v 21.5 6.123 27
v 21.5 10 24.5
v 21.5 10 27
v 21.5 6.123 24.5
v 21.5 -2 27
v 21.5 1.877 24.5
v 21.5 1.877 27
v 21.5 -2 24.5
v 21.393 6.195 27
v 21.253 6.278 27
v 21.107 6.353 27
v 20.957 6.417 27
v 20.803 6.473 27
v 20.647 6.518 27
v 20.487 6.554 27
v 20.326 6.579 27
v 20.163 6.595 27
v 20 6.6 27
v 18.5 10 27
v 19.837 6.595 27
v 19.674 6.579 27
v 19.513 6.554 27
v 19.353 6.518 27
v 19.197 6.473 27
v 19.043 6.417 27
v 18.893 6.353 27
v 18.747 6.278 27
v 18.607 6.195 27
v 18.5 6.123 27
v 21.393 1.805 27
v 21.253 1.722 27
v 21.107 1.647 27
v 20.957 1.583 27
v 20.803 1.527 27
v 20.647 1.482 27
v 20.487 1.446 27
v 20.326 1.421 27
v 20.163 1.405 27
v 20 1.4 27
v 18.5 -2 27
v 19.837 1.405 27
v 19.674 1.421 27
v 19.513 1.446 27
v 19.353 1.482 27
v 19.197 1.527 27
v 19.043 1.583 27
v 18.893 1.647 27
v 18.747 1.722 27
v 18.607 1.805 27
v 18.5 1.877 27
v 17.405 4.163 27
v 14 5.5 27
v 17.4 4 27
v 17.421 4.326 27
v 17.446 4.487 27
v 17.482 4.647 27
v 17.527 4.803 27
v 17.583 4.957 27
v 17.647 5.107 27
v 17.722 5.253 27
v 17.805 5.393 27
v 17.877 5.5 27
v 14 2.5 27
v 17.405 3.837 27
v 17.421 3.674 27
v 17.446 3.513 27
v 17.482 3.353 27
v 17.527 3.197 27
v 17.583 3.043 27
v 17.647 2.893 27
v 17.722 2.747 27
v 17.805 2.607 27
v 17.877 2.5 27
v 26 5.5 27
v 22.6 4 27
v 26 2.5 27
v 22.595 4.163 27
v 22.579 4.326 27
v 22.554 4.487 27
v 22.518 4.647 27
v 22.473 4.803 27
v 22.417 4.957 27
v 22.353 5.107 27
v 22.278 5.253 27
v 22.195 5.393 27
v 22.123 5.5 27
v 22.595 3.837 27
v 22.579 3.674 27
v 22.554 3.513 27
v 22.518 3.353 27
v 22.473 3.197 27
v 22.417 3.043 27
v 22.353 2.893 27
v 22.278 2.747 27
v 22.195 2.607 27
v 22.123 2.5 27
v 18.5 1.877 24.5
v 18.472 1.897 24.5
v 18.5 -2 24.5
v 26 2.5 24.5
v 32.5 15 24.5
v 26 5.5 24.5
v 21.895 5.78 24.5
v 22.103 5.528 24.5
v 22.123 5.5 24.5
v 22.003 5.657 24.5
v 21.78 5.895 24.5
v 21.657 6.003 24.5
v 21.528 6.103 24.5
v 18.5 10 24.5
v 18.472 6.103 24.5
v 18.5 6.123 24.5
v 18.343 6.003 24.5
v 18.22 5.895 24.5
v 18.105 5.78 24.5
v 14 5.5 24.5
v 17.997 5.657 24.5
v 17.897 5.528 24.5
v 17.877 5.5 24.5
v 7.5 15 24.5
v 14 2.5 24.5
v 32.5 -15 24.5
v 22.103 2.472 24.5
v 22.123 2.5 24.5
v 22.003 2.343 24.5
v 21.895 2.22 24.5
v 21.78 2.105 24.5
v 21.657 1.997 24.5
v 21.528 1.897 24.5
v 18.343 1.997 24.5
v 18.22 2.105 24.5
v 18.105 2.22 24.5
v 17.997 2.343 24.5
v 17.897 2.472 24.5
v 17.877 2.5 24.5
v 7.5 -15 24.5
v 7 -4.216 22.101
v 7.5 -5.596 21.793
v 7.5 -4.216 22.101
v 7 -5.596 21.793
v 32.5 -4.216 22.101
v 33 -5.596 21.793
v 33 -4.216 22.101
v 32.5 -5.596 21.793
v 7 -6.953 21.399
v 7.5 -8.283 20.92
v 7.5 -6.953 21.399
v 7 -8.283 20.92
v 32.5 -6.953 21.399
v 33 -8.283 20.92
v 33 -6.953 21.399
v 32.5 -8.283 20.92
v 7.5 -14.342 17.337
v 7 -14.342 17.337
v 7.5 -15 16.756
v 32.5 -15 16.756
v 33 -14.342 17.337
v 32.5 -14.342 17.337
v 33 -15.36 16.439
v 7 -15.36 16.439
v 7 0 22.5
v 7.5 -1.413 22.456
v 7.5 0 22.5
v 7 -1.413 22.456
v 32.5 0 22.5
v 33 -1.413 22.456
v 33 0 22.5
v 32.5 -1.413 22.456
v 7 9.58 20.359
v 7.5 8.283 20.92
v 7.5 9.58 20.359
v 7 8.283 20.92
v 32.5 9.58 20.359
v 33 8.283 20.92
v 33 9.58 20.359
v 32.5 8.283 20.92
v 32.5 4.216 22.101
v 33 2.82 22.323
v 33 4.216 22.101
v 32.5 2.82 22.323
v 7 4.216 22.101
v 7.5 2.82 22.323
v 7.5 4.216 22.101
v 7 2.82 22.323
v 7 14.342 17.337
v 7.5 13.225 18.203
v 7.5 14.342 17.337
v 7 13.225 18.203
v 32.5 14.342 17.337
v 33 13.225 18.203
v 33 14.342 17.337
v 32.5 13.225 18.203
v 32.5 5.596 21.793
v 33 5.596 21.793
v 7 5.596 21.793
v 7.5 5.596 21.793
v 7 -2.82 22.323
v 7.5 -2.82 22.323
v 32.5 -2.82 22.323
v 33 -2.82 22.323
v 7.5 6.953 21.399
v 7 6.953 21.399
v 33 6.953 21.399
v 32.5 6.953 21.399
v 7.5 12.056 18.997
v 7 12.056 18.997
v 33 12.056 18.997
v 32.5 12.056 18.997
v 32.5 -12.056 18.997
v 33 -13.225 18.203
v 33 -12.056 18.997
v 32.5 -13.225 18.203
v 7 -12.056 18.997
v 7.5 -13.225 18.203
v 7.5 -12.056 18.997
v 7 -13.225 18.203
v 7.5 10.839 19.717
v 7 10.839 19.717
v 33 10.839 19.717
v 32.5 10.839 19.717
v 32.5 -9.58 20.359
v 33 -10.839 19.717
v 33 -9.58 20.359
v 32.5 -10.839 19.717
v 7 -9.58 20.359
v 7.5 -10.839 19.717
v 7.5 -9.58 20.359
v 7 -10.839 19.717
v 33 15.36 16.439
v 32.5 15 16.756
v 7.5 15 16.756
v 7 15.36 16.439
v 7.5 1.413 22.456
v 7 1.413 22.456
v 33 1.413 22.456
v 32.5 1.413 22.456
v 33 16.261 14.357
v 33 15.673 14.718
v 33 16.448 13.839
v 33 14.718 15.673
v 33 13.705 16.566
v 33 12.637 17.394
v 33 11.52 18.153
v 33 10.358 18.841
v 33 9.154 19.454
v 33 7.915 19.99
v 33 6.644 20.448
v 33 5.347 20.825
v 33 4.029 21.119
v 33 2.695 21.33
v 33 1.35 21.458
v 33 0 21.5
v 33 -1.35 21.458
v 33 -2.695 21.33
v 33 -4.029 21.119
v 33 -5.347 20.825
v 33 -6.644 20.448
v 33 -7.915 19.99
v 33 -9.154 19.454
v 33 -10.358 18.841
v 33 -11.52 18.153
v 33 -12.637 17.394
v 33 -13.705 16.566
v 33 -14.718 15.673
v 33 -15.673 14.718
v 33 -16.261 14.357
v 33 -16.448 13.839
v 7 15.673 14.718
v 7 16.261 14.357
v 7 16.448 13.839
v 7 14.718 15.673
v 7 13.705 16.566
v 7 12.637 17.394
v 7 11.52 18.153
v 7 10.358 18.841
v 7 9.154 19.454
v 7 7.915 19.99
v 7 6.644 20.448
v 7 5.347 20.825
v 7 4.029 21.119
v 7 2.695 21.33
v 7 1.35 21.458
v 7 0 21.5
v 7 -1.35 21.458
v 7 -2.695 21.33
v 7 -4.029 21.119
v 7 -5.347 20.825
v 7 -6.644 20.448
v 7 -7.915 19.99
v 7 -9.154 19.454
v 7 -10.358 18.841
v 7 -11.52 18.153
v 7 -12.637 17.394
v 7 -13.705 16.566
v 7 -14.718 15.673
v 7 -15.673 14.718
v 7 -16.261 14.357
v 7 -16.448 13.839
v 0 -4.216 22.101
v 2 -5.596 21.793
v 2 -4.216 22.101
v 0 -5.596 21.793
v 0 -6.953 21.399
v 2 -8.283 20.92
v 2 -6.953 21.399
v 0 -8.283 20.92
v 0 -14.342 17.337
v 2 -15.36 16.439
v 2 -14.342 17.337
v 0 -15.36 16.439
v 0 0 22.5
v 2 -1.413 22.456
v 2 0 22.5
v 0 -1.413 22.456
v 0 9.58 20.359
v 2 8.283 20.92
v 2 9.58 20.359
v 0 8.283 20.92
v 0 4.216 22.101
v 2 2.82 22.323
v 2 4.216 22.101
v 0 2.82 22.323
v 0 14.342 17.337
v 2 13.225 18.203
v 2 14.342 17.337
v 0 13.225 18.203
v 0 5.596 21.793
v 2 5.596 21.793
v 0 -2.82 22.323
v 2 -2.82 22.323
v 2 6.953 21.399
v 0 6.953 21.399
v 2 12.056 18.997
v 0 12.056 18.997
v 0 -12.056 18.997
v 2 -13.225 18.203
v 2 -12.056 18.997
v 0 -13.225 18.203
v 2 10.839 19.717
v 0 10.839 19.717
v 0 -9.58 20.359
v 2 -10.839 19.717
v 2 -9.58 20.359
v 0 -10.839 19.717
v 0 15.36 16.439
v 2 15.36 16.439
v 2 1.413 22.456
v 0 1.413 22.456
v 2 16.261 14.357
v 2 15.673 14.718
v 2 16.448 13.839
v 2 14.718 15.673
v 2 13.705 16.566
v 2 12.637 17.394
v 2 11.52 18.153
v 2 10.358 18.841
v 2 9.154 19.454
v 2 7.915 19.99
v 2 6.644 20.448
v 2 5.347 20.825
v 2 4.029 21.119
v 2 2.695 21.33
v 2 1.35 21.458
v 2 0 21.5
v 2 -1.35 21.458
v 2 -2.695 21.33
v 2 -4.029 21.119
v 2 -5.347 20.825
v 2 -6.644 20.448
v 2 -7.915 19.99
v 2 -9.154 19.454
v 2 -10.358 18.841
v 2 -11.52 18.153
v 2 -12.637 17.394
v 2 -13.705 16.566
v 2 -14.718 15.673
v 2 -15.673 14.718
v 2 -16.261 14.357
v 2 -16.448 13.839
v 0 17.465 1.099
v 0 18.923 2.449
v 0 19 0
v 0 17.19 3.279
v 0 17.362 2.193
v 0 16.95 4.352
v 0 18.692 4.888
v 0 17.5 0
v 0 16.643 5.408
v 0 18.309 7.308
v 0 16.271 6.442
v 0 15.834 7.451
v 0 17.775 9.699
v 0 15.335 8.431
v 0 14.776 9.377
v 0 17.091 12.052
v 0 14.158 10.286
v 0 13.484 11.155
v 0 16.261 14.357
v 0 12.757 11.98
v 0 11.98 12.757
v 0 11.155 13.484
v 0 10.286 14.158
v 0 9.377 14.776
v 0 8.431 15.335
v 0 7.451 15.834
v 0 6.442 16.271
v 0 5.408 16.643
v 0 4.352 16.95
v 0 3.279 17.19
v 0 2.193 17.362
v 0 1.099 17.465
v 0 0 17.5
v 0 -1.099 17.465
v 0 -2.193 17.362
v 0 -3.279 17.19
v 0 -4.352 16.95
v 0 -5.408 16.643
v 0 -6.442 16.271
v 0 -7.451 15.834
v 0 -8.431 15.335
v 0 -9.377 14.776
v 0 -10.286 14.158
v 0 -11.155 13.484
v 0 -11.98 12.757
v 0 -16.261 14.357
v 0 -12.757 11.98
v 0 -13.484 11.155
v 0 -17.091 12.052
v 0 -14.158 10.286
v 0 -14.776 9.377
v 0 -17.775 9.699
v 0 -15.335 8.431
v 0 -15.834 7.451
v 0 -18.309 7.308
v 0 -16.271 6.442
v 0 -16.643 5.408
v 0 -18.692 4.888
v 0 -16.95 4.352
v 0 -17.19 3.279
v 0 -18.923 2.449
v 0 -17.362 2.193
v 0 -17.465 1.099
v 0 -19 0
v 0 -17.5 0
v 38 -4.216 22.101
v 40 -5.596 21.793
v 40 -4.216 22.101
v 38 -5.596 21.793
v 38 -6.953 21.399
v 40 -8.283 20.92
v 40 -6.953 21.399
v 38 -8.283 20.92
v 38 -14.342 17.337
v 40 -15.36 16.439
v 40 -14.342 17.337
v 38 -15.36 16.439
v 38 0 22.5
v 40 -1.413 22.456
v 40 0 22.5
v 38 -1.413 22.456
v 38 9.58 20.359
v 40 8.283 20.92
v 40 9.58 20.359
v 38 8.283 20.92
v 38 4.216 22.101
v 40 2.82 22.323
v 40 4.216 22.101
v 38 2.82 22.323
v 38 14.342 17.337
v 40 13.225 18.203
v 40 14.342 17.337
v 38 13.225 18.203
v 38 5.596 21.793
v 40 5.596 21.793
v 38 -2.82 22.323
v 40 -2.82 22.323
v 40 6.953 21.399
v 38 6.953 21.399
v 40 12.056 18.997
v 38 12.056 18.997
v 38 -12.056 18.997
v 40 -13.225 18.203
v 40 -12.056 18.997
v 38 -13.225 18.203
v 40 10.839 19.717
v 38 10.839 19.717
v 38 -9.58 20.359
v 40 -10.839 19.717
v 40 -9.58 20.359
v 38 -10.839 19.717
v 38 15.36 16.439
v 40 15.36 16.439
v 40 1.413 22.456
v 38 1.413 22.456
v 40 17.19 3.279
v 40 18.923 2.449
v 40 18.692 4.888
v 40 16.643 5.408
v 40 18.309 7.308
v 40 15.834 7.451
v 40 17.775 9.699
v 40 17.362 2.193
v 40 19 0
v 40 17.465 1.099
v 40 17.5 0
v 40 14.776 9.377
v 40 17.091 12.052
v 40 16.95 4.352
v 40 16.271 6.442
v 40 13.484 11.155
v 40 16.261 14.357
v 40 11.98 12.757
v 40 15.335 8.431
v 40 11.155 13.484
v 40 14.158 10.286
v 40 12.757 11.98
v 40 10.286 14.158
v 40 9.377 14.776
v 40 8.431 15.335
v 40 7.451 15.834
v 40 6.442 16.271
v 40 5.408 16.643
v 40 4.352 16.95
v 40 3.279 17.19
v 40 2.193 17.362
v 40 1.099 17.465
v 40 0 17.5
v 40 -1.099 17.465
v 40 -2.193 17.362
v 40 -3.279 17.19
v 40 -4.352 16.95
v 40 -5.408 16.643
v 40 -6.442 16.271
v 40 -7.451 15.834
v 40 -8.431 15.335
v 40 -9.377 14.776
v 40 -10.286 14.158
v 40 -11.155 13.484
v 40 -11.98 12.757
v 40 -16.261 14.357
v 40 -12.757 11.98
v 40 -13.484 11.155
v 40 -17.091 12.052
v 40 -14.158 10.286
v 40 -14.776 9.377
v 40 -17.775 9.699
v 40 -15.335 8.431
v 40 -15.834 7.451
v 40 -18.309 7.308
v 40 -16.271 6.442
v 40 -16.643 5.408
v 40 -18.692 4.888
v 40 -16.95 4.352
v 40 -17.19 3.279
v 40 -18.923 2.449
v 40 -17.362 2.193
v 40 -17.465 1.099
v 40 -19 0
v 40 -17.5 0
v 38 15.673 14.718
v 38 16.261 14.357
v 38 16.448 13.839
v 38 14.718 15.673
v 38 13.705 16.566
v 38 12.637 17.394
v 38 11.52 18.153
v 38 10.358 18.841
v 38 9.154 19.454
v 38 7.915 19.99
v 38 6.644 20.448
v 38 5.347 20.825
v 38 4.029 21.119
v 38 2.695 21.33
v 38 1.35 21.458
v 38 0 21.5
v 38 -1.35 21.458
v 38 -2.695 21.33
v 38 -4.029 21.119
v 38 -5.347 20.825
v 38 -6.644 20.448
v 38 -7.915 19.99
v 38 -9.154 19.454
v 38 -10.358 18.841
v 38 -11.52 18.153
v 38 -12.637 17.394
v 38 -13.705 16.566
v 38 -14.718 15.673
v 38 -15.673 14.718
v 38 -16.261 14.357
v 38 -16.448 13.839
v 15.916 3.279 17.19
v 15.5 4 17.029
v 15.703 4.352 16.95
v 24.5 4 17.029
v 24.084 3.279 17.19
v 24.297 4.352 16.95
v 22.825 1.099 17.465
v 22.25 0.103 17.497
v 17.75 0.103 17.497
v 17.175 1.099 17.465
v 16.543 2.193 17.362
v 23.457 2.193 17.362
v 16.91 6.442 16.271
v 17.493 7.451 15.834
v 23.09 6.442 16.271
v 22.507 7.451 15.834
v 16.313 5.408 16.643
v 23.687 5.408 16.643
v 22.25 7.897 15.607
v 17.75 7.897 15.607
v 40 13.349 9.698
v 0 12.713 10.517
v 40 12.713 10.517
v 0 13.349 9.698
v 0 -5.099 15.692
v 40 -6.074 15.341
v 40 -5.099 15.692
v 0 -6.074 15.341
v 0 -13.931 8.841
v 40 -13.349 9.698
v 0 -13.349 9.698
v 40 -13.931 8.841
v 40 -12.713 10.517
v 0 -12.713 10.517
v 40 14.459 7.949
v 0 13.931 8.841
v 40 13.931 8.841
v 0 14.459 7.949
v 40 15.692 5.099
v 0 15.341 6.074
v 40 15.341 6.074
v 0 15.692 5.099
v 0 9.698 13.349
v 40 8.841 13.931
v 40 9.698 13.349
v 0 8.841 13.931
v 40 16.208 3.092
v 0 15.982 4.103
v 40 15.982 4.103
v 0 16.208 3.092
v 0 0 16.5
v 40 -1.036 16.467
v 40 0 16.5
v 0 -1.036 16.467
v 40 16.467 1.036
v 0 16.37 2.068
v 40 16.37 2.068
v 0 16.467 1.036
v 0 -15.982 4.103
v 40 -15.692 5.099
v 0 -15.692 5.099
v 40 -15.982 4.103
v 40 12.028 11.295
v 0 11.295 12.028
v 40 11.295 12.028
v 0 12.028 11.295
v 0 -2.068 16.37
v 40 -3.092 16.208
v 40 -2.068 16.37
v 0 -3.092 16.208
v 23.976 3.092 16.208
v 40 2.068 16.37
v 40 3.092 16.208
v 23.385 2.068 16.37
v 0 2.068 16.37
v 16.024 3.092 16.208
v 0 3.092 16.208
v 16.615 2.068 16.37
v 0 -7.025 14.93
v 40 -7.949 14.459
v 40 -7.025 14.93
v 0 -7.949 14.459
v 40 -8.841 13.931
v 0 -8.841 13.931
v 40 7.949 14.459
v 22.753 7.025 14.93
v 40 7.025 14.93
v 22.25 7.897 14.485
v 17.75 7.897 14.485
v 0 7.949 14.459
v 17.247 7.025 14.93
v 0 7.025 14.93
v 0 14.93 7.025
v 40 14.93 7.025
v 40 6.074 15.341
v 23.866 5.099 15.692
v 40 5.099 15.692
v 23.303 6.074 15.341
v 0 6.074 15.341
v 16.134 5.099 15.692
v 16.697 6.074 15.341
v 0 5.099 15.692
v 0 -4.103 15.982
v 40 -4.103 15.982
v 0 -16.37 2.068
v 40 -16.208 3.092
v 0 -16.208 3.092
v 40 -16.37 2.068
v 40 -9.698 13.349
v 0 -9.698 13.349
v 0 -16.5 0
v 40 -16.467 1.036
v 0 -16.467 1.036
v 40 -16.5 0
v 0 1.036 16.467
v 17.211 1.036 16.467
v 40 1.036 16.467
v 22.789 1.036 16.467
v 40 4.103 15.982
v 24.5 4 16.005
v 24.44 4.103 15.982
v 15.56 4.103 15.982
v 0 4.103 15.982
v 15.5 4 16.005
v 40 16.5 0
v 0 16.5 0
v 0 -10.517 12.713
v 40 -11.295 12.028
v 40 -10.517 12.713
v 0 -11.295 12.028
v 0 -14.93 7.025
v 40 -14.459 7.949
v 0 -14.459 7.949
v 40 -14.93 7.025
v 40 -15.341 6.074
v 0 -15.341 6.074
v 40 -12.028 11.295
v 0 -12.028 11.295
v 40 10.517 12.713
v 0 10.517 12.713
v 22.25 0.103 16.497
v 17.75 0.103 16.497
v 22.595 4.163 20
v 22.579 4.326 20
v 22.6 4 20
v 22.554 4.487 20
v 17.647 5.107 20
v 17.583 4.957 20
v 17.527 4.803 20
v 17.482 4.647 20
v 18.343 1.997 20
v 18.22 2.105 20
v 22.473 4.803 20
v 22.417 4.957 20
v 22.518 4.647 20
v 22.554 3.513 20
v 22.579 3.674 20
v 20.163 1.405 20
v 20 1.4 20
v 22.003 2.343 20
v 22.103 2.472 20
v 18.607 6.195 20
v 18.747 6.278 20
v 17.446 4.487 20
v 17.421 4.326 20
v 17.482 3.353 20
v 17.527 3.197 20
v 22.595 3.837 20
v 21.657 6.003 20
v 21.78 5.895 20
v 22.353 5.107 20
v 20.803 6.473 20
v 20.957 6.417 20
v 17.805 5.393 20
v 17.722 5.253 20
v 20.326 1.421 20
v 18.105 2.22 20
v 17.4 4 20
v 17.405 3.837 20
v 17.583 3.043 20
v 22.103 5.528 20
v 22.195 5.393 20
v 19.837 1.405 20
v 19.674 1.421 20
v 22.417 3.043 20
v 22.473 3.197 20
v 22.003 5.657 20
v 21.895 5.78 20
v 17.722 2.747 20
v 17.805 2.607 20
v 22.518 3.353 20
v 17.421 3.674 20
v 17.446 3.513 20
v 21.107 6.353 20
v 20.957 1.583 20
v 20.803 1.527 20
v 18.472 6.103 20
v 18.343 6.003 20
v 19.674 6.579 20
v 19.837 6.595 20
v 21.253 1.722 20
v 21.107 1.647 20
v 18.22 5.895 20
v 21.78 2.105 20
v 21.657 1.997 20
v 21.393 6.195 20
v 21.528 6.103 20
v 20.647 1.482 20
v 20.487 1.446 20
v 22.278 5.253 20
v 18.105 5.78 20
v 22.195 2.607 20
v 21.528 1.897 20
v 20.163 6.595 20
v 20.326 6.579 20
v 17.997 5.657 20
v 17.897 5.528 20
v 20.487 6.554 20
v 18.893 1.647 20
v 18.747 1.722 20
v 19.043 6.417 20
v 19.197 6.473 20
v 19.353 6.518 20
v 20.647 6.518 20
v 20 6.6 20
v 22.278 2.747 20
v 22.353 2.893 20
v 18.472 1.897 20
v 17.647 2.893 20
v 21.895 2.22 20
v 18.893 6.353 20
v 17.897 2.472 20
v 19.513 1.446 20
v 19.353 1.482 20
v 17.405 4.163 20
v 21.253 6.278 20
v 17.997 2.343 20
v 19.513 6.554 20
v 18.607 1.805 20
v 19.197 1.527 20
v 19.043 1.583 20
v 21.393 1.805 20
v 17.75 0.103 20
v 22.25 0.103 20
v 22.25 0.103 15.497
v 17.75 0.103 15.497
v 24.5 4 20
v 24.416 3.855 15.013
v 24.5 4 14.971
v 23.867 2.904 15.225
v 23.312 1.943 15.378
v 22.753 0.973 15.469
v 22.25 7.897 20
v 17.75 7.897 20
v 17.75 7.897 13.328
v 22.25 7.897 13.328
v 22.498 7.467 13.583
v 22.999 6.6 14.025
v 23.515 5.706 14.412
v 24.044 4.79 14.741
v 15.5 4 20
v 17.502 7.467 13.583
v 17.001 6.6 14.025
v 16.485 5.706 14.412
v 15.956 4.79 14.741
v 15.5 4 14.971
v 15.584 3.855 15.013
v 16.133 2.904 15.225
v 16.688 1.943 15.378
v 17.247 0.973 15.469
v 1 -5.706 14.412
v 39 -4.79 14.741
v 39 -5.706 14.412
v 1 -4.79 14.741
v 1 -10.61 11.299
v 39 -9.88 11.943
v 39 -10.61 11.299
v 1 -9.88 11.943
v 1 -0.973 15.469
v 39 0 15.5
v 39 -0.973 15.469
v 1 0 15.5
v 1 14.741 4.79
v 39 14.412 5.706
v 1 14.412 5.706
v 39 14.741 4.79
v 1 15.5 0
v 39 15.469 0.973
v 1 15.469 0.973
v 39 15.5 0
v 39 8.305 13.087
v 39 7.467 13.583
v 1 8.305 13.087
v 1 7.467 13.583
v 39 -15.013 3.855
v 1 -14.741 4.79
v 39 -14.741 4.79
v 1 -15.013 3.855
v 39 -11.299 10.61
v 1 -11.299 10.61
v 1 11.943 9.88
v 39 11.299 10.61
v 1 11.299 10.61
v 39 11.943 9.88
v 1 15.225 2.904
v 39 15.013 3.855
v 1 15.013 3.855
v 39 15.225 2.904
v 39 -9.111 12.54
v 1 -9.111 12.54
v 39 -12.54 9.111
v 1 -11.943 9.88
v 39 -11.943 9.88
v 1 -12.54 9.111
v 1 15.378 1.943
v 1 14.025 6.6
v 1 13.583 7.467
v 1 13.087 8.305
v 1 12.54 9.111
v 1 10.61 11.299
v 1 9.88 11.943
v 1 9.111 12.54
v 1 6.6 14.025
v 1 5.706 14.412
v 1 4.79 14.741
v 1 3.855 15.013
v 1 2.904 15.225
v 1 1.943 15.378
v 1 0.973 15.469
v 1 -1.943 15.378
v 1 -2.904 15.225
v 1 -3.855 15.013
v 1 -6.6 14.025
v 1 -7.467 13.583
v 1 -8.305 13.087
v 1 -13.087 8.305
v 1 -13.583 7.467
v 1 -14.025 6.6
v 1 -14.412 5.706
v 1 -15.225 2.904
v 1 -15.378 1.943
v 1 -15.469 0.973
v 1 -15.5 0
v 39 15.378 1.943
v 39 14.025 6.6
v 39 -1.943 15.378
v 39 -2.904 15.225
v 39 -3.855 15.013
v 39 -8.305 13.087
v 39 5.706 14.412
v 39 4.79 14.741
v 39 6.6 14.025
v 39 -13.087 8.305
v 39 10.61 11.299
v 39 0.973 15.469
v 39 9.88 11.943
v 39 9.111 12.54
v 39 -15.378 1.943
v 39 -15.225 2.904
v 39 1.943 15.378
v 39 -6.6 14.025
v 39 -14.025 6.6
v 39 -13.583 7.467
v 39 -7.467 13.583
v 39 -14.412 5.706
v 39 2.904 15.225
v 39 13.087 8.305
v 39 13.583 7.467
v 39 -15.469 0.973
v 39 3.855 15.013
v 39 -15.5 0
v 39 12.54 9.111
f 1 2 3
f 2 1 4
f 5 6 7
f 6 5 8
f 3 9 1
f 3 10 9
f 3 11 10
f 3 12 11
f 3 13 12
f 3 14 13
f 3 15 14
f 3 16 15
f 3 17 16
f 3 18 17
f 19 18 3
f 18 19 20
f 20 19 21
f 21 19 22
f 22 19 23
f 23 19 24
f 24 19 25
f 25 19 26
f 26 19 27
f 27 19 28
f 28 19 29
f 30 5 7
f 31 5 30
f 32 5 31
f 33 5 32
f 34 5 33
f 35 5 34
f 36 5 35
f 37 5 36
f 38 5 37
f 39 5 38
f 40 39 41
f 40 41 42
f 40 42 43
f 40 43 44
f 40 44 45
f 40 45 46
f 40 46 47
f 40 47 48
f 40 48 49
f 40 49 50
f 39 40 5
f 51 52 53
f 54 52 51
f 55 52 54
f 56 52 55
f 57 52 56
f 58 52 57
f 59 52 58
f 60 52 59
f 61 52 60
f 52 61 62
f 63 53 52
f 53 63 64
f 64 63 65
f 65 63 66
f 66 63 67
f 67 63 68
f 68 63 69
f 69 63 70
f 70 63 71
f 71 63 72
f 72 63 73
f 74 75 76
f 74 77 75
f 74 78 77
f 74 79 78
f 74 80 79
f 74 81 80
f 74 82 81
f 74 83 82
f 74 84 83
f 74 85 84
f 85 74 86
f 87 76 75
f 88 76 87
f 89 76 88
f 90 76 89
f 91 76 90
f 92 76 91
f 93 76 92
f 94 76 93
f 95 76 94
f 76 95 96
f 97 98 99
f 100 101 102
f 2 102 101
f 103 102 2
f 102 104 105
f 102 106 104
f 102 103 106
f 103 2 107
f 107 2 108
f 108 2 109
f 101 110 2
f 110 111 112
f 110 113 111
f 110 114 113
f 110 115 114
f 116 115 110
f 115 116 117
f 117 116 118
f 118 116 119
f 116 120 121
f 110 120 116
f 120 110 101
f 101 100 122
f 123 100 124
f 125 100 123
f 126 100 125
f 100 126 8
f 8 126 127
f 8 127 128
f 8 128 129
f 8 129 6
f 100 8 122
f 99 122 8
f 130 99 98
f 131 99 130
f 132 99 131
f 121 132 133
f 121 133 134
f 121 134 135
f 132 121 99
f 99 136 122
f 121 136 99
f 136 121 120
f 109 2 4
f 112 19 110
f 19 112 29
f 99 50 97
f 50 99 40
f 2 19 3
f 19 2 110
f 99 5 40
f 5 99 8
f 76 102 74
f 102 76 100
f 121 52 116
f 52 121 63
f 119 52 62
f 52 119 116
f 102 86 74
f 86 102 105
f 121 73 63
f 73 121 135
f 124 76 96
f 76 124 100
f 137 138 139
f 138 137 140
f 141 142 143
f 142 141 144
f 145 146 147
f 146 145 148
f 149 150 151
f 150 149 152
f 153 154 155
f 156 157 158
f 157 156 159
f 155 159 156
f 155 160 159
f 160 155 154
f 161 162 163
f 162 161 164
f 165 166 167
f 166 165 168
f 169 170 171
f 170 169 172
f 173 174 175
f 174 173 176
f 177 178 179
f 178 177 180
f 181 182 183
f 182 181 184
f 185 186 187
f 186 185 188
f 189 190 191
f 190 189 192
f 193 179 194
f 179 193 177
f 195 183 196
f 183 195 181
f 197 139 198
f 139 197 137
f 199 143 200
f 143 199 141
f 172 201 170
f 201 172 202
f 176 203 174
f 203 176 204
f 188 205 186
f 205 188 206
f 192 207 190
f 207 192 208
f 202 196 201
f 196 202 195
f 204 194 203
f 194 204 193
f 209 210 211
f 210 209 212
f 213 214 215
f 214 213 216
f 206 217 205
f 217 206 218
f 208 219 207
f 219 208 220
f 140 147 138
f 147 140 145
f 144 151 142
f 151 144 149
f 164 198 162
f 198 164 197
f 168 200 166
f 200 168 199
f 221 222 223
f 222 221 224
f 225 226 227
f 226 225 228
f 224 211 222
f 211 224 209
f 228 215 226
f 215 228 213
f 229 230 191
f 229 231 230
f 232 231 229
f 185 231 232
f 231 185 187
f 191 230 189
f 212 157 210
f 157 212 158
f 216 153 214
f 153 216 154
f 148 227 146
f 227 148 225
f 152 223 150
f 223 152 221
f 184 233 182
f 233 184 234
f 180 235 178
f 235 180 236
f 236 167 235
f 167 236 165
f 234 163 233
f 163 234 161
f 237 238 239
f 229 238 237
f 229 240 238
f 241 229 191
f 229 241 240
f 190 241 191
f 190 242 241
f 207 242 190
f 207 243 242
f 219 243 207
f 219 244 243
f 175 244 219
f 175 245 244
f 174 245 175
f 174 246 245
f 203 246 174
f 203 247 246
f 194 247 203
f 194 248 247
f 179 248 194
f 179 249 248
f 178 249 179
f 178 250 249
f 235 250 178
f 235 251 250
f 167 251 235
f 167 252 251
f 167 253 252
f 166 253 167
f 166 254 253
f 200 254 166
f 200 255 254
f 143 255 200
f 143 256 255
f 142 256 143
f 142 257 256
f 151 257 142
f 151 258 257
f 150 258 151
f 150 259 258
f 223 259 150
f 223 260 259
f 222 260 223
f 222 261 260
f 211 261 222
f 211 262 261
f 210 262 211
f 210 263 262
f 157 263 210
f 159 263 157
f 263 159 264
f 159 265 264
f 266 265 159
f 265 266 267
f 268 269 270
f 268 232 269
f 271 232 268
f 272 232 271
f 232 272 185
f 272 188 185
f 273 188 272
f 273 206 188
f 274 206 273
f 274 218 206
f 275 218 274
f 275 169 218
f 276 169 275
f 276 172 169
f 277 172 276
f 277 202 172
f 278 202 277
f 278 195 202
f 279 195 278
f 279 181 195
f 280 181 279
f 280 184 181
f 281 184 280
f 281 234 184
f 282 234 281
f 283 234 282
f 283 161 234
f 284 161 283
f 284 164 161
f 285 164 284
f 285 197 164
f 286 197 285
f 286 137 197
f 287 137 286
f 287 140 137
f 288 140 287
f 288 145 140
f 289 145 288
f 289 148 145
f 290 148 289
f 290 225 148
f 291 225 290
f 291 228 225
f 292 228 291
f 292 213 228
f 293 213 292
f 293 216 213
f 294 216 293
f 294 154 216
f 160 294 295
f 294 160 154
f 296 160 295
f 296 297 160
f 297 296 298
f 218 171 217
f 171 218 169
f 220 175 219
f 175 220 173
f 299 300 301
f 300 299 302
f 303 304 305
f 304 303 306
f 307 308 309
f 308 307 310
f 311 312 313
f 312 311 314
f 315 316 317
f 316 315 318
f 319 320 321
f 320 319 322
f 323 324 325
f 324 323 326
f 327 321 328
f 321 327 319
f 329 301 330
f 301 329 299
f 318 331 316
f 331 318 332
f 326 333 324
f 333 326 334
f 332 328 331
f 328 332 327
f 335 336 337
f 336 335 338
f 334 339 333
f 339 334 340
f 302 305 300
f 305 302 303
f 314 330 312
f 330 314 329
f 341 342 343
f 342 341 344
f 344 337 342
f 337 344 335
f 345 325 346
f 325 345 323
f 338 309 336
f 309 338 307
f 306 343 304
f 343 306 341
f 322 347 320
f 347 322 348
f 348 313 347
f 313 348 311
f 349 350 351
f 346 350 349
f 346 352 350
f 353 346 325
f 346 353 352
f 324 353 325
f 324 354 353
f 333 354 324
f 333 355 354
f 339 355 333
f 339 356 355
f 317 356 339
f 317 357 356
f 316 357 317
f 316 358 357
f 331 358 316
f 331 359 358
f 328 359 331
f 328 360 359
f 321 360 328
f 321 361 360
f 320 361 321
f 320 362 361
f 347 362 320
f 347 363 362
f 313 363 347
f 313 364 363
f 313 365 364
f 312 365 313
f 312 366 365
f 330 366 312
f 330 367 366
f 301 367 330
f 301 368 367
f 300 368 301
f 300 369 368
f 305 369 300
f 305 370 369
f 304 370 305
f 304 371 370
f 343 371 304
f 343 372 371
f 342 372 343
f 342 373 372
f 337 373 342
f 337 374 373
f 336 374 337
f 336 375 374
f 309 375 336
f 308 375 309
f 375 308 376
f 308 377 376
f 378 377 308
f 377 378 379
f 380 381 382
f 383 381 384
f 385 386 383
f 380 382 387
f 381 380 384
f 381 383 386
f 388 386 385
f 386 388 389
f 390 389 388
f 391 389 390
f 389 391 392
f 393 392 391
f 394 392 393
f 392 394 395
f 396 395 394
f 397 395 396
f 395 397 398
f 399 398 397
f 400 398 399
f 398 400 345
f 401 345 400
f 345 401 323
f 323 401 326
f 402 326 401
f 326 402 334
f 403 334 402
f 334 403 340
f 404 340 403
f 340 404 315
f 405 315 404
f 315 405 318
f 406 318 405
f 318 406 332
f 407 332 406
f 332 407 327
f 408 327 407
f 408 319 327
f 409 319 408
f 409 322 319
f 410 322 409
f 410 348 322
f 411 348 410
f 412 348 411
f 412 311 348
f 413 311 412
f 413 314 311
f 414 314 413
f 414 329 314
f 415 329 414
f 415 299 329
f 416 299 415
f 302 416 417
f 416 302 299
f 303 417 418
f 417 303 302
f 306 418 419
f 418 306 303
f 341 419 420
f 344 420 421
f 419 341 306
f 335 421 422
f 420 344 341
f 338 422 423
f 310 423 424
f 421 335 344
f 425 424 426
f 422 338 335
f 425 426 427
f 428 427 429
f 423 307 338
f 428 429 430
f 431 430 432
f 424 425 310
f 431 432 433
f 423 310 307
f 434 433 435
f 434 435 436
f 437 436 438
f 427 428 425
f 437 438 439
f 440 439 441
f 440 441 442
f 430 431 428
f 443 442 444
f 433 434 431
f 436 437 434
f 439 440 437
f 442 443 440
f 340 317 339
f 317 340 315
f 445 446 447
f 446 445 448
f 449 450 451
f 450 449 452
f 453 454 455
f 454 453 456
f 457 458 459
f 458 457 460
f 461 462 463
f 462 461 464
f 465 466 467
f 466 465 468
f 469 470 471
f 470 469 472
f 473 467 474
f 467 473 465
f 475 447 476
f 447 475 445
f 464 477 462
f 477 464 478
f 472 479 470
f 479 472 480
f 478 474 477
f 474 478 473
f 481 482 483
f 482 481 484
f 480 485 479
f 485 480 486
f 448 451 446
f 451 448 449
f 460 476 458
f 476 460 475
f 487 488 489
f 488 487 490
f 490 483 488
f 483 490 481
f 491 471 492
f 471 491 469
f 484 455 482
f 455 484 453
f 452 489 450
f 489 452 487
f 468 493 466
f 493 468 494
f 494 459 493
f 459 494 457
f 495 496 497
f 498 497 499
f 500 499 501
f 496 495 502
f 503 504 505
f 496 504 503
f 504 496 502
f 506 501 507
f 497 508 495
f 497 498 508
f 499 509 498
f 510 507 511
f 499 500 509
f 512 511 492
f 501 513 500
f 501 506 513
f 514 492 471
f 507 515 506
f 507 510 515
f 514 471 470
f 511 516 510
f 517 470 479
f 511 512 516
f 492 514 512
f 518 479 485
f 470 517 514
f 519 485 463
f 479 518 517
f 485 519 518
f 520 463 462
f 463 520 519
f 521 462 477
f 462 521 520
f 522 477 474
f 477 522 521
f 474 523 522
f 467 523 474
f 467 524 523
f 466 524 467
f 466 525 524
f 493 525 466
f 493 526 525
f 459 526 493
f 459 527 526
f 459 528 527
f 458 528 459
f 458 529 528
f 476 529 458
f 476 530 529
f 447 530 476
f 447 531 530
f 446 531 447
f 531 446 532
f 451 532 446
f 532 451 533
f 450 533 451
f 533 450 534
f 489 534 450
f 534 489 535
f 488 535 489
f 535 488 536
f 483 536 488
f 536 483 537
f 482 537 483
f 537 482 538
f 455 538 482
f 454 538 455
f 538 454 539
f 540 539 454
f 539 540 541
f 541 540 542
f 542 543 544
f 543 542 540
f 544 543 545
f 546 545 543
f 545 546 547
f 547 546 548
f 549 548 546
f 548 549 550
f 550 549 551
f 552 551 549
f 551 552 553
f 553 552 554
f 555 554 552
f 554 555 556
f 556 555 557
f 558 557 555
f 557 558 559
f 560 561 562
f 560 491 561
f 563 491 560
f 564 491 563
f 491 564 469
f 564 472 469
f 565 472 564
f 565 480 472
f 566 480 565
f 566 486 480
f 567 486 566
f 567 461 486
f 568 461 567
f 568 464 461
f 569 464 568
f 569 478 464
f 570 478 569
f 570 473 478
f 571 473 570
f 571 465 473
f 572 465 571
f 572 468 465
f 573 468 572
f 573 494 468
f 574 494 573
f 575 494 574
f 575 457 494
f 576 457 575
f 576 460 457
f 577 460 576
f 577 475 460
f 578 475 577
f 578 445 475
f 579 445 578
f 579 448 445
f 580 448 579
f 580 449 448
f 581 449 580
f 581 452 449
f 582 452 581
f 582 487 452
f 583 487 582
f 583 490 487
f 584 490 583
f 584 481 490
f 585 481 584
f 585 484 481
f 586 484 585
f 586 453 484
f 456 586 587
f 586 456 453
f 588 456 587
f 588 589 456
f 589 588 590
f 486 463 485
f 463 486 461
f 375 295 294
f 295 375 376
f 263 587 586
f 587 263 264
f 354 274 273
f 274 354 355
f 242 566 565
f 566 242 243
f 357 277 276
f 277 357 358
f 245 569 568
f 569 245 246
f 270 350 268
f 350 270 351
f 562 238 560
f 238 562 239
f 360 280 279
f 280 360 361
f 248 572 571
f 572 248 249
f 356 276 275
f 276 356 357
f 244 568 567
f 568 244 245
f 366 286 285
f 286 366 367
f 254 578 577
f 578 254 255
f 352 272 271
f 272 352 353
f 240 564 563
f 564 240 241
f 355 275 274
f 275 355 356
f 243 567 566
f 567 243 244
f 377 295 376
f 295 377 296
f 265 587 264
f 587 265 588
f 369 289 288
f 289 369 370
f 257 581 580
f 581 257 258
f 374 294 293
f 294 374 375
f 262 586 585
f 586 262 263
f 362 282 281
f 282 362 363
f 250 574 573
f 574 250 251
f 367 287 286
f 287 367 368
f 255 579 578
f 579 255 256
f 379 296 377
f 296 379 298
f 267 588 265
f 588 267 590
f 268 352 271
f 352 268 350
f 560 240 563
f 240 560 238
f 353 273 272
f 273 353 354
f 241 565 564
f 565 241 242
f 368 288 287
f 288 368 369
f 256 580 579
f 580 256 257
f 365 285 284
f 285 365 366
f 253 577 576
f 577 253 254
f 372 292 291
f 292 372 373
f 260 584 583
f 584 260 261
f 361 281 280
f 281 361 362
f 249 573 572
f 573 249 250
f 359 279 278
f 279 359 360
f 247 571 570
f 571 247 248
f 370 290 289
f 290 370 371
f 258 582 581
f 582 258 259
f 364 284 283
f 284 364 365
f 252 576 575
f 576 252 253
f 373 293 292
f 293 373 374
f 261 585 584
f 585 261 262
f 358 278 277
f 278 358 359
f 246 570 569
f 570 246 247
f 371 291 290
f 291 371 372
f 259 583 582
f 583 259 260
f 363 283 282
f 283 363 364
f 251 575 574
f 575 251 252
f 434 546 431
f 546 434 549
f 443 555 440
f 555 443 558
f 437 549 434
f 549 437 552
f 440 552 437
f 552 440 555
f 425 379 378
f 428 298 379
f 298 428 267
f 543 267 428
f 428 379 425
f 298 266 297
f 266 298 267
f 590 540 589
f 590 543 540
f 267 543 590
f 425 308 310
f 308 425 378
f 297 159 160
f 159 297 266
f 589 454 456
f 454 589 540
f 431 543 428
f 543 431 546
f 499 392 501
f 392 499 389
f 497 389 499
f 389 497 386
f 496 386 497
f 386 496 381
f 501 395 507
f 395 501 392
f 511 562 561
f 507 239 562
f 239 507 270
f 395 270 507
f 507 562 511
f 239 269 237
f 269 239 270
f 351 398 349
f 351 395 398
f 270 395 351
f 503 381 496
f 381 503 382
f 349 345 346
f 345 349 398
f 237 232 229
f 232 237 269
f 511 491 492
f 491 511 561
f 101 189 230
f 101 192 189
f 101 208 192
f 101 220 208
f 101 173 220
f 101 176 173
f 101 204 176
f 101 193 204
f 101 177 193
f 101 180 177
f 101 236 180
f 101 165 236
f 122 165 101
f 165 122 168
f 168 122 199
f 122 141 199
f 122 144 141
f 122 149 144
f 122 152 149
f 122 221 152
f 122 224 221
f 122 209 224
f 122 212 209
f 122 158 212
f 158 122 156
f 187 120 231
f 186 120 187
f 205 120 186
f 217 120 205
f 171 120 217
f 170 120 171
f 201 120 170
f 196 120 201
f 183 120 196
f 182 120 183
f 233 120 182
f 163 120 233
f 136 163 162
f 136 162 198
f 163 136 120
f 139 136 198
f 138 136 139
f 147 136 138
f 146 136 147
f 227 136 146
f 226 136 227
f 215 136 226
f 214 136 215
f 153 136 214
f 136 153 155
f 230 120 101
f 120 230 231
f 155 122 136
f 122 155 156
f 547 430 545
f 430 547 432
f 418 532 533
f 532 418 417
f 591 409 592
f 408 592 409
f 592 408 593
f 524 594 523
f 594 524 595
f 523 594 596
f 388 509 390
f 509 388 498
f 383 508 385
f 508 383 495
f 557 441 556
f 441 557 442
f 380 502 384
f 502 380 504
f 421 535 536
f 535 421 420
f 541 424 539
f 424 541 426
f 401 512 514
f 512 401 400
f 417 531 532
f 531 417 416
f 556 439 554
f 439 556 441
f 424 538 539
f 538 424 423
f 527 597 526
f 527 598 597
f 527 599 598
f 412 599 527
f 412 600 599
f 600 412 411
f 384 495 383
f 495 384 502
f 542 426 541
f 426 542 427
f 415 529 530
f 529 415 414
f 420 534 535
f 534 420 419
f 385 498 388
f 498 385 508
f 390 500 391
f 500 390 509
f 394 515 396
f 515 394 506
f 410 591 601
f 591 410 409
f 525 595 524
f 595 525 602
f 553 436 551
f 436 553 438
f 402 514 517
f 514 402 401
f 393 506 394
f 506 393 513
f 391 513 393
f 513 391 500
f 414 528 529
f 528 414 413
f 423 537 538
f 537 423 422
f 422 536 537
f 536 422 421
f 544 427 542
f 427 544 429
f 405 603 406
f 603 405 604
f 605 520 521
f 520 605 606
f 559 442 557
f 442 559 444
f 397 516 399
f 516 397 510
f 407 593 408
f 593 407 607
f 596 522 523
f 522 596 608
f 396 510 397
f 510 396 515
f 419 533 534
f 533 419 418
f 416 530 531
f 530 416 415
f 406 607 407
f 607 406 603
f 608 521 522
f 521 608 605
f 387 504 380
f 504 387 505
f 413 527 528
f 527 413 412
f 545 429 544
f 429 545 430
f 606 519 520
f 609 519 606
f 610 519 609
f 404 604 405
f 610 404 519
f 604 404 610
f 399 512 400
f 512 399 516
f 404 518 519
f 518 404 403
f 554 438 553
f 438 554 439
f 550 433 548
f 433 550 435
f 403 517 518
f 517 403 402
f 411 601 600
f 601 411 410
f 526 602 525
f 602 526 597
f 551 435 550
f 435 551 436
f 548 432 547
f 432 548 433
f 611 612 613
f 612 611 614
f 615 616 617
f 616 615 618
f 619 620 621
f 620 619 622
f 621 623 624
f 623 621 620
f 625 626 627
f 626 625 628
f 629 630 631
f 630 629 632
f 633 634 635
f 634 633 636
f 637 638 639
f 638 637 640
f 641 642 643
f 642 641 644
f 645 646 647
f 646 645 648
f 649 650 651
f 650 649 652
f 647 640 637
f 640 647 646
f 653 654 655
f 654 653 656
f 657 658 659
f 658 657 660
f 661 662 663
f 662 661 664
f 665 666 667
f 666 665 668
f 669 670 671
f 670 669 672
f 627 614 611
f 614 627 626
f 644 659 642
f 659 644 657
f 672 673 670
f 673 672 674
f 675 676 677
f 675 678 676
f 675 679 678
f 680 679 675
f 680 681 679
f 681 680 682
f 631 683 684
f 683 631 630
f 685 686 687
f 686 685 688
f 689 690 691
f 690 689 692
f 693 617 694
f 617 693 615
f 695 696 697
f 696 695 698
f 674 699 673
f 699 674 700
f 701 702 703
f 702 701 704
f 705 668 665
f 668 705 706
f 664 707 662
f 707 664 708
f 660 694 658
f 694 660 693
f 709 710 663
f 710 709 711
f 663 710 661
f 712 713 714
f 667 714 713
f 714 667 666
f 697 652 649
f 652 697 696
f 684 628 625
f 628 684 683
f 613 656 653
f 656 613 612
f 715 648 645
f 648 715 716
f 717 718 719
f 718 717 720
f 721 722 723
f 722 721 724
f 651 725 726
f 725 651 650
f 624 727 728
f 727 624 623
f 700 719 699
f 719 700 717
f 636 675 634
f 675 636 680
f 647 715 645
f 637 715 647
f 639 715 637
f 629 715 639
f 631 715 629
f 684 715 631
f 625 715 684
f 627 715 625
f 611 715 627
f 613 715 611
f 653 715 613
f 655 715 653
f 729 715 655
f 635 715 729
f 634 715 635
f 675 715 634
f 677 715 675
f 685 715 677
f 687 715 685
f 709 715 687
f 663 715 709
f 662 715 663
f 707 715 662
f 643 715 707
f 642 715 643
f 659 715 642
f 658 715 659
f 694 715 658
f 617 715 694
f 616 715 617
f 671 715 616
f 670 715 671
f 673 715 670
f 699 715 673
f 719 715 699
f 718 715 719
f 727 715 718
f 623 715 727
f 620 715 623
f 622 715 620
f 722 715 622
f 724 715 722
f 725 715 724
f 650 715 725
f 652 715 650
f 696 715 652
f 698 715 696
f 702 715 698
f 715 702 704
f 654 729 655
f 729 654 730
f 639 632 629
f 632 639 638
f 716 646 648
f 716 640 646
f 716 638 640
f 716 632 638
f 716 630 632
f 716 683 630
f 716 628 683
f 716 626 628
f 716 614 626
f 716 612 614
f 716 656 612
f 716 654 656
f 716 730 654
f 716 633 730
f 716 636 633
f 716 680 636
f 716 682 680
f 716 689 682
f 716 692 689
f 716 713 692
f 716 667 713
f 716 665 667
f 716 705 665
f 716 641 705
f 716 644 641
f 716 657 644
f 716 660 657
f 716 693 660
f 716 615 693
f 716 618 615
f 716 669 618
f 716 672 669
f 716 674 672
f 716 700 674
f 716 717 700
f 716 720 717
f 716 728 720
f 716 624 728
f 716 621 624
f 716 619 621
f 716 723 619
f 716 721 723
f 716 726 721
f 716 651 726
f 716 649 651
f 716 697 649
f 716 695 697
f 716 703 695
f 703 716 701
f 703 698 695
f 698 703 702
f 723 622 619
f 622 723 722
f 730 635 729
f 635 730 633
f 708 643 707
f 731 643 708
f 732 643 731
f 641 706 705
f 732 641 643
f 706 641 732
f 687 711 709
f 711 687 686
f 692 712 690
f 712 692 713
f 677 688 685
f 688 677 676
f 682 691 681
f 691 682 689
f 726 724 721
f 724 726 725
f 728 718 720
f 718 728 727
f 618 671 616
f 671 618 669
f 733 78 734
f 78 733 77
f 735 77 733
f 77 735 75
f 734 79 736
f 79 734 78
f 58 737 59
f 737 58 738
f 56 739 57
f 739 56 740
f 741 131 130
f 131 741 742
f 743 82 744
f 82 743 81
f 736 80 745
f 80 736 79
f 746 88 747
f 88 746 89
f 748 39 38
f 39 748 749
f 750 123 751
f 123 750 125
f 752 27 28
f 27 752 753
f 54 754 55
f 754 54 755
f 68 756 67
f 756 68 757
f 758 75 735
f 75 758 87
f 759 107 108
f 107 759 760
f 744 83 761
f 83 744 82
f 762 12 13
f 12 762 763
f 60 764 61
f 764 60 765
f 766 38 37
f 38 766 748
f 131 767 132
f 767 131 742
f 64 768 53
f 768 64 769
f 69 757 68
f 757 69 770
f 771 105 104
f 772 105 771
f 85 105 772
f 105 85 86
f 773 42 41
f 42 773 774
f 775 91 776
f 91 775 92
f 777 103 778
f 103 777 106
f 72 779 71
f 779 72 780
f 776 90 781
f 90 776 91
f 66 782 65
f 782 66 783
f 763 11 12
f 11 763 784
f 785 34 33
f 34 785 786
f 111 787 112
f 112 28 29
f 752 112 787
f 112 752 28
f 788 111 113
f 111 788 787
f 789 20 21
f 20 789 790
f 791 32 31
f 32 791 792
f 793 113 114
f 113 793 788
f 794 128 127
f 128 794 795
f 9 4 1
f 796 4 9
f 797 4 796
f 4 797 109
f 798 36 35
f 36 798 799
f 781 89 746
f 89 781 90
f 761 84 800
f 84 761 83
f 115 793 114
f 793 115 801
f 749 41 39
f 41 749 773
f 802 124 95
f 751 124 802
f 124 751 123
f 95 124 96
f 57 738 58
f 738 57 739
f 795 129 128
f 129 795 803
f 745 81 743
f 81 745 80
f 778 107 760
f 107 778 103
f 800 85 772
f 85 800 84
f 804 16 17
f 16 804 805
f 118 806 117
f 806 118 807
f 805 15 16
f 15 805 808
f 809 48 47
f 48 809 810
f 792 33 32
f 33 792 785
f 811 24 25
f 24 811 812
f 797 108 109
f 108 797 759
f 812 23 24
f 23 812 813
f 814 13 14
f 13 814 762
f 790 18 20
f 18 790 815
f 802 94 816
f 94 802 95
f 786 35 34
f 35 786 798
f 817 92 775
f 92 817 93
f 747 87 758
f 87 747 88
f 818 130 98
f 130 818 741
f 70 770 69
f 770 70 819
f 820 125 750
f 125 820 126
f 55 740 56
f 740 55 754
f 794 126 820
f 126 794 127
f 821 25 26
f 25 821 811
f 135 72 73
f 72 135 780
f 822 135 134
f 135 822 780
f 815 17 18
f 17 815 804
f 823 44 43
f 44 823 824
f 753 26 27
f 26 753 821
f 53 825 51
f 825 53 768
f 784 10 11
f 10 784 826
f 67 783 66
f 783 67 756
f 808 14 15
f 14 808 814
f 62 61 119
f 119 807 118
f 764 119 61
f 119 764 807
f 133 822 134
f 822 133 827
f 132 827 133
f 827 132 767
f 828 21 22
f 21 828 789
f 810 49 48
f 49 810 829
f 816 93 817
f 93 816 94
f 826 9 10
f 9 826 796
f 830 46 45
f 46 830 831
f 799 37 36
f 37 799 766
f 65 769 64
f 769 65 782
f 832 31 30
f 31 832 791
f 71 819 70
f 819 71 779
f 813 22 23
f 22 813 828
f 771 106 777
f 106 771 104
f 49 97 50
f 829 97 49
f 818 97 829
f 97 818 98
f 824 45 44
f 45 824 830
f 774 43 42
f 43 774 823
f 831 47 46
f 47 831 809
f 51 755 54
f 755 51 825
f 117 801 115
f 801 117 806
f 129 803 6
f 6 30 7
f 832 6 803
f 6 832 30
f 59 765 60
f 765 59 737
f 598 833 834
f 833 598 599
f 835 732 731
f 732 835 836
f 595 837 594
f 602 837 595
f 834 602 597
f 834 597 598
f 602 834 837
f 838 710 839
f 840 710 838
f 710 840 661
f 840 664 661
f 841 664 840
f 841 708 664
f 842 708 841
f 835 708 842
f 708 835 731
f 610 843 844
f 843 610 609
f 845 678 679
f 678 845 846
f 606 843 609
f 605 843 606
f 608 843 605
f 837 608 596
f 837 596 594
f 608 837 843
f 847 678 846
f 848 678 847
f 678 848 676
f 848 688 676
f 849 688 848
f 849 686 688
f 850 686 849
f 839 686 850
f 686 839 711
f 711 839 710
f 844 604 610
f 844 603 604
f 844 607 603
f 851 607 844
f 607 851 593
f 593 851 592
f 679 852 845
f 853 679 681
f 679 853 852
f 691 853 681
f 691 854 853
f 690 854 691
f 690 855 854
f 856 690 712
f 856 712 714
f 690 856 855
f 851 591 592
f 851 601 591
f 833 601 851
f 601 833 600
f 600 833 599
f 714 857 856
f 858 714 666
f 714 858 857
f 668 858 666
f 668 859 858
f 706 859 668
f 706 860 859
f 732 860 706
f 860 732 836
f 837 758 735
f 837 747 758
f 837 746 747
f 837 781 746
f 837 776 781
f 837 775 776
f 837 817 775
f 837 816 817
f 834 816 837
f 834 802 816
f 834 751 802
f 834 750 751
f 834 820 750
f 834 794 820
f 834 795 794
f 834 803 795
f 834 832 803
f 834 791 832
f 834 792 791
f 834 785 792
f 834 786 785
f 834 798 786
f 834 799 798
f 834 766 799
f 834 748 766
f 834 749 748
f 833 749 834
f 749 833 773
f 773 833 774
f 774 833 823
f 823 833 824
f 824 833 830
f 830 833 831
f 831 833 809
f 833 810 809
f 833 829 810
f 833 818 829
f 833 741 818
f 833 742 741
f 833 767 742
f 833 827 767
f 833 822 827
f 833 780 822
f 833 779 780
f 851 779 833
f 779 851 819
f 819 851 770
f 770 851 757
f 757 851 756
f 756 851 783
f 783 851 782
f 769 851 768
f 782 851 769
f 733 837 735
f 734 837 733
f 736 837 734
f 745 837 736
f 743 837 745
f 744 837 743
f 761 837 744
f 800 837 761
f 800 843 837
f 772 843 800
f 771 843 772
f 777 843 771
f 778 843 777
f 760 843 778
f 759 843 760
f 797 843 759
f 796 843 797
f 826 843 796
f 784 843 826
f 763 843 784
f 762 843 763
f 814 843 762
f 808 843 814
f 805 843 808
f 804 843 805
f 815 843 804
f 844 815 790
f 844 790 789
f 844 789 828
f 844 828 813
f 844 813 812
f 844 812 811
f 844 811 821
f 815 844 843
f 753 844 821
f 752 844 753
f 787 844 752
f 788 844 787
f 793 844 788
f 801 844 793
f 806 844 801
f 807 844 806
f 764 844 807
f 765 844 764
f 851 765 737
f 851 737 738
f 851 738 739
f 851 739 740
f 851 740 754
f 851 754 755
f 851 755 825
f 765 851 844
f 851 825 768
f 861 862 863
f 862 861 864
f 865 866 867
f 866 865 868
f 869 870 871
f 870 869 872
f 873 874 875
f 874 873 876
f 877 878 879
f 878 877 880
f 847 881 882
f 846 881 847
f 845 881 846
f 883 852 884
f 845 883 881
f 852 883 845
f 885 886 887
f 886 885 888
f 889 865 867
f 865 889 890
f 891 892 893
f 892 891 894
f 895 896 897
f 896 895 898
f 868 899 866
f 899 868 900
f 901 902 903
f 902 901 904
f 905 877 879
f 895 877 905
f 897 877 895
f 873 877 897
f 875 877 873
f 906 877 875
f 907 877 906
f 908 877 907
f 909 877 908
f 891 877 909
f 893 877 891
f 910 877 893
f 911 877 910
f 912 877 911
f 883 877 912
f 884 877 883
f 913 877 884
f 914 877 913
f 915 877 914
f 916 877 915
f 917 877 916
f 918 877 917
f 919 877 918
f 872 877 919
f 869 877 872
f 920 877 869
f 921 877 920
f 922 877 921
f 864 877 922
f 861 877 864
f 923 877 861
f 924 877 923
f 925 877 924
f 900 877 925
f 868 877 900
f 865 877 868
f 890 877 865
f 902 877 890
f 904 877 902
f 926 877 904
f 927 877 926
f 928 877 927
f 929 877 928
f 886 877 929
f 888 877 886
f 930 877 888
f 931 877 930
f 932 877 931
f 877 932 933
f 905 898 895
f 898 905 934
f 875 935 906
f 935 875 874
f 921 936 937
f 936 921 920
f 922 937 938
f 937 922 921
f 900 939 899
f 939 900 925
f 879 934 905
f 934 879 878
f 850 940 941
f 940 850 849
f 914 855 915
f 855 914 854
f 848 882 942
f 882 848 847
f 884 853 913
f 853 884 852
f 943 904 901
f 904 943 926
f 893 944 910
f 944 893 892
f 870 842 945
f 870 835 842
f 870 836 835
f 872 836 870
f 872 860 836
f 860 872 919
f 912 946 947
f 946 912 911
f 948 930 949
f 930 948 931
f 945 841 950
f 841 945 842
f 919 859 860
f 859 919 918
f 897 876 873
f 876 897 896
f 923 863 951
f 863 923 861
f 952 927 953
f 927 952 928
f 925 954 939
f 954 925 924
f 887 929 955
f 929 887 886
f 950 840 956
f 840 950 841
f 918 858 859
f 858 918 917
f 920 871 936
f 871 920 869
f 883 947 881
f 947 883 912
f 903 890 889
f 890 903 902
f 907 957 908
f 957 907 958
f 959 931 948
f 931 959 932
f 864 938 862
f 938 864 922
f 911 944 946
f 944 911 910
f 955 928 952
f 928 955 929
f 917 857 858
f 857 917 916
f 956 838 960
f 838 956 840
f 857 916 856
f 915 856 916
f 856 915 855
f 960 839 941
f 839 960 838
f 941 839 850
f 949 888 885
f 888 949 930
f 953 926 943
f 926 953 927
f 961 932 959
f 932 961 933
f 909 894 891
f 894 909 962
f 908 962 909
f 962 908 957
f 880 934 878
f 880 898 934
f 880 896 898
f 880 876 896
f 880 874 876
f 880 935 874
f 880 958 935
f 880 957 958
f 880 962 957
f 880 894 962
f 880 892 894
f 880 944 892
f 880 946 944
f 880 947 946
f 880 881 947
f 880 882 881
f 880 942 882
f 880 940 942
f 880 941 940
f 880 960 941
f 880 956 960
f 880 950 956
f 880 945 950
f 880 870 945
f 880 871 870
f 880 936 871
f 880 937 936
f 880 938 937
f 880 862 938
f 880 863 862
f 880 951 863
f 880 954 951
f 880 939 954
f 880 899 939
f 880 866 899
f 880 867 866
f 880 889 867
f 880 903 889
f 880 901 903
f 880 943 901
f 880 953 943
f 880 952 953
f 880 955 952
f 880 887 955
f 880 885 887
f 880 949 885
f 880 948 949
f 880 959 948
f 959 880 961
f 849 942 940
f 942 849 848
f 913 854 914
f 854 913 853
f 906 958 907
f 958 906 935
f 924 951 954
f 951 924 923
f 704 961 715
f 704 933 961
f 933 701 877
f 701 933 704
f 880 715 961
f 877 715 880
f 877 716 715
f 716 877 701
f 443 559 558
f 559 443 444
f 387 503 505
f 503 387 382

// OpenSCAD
$fn = 100;

$diameter = 35;
$length = 40;
$width = 5;

$cabletie = 5;
$border = 2;

$topwidth = 30;
$toplength = 25;
$topheight = 2;

$offset = 4;

difference () {
    union () {
        difference() {
            union () {
                // block
                translate([$length/2-$toplength/2,-$topwidth/2,0]) 
                    cube([$toplength,$topwidth,$diameter/2+$width+$topheight]);

                // guide cross
                translate ([0,$offset,0]) {
                    translate([$length/2-3/2,-6,$diameter/2+$width+2])
                        cube([3,12,2.5]);
                    translate([$length/2-6,0-3/2,$diameter/2+$width+2])
                        cube([12,3, 2.5]);
                }

                difference () {
                    union () {
                        // center cylinder
                        translate([$cabletie+$border,0,0]) 
                            rotate([0,90,0]) cylinder($length-($cabletie+$border)*2,$diameter/2+$width,$diameter/2+$width);
                        // end caps
                        translate([0,0,0]) 
                            rotate([0,90,0]) cylinder(2,$diameter/2+$width,$diameter/2+$width);
                        translate([$length-2,0,0]) 
                            rotate([0,90,0]) cylinder(2,$diameter/2+$width,$diameter/2+$width);
                        // main cylinder
                        rotate([0,90,0]) cylinder($length,$diameter/2+$width-1,$diameter/2+$width-1);
                    }

                    // cutoffs in the side #1
                    translate([0,$diameter/2+$width/2,0])
                    {
                        difference() {
                            rotate([0,90,0]) translate([0,0,-1]) cylinder($length+2,$diameter*2+$width-1,$diameter*2+$width-1);
                            rotate([0,90,0]) translate([0,0,-2]) cylinder($length+4,$diameter+$width-1,$diameter+$width-1);
                        }
                    }
                    // cutoffs in the side #2
                    translate([0,-$diameter/2-$width/2,0])
                    {
                        difference() {
                            rotate([0,90,0]) translate([0,0,-1]) cylinder($length+2,$diameter*2+$width-1,$diameter*2+$width-1);
                            rotate([0,90,0]) translate([0,0,-2]) cylinder($length+4,$diameter+$width-1,$diameter+$width-1);
                        }
                    }
                }
            }
            
            // mount cylinder
            translate([-1,0,0]) 
                rotate([0,90,0]) cylinder($length+2,$diameter/2,$diameter/2);

        }        
        // support cylinder
        rotate([0,90,0]) cylinder($length,$diameter/2-1,$diameter/2-1);
    }
    
    // hollow support cylinder
    translate ([1,0,0])
        rotate([0,90,0]) cylinder($length-2,$diameter/2-2,$diameter/2-2);
    
    // remove bottom
    translate([-25,-50,-100])
        cube([100,100,100]);
    
    // hole for screw and hex nut
    translate ([0,$offset,0]) {
        // hole for screw (m5)
        translate([$length/2,0,0])
            cylinder(100,2.6,2.6);
        // hole for nut (m5)
        translate([$length/2,0,0])
            cylinder($fn=6, $diameter/2+$width/2,4.5,4.5);
    }
}
